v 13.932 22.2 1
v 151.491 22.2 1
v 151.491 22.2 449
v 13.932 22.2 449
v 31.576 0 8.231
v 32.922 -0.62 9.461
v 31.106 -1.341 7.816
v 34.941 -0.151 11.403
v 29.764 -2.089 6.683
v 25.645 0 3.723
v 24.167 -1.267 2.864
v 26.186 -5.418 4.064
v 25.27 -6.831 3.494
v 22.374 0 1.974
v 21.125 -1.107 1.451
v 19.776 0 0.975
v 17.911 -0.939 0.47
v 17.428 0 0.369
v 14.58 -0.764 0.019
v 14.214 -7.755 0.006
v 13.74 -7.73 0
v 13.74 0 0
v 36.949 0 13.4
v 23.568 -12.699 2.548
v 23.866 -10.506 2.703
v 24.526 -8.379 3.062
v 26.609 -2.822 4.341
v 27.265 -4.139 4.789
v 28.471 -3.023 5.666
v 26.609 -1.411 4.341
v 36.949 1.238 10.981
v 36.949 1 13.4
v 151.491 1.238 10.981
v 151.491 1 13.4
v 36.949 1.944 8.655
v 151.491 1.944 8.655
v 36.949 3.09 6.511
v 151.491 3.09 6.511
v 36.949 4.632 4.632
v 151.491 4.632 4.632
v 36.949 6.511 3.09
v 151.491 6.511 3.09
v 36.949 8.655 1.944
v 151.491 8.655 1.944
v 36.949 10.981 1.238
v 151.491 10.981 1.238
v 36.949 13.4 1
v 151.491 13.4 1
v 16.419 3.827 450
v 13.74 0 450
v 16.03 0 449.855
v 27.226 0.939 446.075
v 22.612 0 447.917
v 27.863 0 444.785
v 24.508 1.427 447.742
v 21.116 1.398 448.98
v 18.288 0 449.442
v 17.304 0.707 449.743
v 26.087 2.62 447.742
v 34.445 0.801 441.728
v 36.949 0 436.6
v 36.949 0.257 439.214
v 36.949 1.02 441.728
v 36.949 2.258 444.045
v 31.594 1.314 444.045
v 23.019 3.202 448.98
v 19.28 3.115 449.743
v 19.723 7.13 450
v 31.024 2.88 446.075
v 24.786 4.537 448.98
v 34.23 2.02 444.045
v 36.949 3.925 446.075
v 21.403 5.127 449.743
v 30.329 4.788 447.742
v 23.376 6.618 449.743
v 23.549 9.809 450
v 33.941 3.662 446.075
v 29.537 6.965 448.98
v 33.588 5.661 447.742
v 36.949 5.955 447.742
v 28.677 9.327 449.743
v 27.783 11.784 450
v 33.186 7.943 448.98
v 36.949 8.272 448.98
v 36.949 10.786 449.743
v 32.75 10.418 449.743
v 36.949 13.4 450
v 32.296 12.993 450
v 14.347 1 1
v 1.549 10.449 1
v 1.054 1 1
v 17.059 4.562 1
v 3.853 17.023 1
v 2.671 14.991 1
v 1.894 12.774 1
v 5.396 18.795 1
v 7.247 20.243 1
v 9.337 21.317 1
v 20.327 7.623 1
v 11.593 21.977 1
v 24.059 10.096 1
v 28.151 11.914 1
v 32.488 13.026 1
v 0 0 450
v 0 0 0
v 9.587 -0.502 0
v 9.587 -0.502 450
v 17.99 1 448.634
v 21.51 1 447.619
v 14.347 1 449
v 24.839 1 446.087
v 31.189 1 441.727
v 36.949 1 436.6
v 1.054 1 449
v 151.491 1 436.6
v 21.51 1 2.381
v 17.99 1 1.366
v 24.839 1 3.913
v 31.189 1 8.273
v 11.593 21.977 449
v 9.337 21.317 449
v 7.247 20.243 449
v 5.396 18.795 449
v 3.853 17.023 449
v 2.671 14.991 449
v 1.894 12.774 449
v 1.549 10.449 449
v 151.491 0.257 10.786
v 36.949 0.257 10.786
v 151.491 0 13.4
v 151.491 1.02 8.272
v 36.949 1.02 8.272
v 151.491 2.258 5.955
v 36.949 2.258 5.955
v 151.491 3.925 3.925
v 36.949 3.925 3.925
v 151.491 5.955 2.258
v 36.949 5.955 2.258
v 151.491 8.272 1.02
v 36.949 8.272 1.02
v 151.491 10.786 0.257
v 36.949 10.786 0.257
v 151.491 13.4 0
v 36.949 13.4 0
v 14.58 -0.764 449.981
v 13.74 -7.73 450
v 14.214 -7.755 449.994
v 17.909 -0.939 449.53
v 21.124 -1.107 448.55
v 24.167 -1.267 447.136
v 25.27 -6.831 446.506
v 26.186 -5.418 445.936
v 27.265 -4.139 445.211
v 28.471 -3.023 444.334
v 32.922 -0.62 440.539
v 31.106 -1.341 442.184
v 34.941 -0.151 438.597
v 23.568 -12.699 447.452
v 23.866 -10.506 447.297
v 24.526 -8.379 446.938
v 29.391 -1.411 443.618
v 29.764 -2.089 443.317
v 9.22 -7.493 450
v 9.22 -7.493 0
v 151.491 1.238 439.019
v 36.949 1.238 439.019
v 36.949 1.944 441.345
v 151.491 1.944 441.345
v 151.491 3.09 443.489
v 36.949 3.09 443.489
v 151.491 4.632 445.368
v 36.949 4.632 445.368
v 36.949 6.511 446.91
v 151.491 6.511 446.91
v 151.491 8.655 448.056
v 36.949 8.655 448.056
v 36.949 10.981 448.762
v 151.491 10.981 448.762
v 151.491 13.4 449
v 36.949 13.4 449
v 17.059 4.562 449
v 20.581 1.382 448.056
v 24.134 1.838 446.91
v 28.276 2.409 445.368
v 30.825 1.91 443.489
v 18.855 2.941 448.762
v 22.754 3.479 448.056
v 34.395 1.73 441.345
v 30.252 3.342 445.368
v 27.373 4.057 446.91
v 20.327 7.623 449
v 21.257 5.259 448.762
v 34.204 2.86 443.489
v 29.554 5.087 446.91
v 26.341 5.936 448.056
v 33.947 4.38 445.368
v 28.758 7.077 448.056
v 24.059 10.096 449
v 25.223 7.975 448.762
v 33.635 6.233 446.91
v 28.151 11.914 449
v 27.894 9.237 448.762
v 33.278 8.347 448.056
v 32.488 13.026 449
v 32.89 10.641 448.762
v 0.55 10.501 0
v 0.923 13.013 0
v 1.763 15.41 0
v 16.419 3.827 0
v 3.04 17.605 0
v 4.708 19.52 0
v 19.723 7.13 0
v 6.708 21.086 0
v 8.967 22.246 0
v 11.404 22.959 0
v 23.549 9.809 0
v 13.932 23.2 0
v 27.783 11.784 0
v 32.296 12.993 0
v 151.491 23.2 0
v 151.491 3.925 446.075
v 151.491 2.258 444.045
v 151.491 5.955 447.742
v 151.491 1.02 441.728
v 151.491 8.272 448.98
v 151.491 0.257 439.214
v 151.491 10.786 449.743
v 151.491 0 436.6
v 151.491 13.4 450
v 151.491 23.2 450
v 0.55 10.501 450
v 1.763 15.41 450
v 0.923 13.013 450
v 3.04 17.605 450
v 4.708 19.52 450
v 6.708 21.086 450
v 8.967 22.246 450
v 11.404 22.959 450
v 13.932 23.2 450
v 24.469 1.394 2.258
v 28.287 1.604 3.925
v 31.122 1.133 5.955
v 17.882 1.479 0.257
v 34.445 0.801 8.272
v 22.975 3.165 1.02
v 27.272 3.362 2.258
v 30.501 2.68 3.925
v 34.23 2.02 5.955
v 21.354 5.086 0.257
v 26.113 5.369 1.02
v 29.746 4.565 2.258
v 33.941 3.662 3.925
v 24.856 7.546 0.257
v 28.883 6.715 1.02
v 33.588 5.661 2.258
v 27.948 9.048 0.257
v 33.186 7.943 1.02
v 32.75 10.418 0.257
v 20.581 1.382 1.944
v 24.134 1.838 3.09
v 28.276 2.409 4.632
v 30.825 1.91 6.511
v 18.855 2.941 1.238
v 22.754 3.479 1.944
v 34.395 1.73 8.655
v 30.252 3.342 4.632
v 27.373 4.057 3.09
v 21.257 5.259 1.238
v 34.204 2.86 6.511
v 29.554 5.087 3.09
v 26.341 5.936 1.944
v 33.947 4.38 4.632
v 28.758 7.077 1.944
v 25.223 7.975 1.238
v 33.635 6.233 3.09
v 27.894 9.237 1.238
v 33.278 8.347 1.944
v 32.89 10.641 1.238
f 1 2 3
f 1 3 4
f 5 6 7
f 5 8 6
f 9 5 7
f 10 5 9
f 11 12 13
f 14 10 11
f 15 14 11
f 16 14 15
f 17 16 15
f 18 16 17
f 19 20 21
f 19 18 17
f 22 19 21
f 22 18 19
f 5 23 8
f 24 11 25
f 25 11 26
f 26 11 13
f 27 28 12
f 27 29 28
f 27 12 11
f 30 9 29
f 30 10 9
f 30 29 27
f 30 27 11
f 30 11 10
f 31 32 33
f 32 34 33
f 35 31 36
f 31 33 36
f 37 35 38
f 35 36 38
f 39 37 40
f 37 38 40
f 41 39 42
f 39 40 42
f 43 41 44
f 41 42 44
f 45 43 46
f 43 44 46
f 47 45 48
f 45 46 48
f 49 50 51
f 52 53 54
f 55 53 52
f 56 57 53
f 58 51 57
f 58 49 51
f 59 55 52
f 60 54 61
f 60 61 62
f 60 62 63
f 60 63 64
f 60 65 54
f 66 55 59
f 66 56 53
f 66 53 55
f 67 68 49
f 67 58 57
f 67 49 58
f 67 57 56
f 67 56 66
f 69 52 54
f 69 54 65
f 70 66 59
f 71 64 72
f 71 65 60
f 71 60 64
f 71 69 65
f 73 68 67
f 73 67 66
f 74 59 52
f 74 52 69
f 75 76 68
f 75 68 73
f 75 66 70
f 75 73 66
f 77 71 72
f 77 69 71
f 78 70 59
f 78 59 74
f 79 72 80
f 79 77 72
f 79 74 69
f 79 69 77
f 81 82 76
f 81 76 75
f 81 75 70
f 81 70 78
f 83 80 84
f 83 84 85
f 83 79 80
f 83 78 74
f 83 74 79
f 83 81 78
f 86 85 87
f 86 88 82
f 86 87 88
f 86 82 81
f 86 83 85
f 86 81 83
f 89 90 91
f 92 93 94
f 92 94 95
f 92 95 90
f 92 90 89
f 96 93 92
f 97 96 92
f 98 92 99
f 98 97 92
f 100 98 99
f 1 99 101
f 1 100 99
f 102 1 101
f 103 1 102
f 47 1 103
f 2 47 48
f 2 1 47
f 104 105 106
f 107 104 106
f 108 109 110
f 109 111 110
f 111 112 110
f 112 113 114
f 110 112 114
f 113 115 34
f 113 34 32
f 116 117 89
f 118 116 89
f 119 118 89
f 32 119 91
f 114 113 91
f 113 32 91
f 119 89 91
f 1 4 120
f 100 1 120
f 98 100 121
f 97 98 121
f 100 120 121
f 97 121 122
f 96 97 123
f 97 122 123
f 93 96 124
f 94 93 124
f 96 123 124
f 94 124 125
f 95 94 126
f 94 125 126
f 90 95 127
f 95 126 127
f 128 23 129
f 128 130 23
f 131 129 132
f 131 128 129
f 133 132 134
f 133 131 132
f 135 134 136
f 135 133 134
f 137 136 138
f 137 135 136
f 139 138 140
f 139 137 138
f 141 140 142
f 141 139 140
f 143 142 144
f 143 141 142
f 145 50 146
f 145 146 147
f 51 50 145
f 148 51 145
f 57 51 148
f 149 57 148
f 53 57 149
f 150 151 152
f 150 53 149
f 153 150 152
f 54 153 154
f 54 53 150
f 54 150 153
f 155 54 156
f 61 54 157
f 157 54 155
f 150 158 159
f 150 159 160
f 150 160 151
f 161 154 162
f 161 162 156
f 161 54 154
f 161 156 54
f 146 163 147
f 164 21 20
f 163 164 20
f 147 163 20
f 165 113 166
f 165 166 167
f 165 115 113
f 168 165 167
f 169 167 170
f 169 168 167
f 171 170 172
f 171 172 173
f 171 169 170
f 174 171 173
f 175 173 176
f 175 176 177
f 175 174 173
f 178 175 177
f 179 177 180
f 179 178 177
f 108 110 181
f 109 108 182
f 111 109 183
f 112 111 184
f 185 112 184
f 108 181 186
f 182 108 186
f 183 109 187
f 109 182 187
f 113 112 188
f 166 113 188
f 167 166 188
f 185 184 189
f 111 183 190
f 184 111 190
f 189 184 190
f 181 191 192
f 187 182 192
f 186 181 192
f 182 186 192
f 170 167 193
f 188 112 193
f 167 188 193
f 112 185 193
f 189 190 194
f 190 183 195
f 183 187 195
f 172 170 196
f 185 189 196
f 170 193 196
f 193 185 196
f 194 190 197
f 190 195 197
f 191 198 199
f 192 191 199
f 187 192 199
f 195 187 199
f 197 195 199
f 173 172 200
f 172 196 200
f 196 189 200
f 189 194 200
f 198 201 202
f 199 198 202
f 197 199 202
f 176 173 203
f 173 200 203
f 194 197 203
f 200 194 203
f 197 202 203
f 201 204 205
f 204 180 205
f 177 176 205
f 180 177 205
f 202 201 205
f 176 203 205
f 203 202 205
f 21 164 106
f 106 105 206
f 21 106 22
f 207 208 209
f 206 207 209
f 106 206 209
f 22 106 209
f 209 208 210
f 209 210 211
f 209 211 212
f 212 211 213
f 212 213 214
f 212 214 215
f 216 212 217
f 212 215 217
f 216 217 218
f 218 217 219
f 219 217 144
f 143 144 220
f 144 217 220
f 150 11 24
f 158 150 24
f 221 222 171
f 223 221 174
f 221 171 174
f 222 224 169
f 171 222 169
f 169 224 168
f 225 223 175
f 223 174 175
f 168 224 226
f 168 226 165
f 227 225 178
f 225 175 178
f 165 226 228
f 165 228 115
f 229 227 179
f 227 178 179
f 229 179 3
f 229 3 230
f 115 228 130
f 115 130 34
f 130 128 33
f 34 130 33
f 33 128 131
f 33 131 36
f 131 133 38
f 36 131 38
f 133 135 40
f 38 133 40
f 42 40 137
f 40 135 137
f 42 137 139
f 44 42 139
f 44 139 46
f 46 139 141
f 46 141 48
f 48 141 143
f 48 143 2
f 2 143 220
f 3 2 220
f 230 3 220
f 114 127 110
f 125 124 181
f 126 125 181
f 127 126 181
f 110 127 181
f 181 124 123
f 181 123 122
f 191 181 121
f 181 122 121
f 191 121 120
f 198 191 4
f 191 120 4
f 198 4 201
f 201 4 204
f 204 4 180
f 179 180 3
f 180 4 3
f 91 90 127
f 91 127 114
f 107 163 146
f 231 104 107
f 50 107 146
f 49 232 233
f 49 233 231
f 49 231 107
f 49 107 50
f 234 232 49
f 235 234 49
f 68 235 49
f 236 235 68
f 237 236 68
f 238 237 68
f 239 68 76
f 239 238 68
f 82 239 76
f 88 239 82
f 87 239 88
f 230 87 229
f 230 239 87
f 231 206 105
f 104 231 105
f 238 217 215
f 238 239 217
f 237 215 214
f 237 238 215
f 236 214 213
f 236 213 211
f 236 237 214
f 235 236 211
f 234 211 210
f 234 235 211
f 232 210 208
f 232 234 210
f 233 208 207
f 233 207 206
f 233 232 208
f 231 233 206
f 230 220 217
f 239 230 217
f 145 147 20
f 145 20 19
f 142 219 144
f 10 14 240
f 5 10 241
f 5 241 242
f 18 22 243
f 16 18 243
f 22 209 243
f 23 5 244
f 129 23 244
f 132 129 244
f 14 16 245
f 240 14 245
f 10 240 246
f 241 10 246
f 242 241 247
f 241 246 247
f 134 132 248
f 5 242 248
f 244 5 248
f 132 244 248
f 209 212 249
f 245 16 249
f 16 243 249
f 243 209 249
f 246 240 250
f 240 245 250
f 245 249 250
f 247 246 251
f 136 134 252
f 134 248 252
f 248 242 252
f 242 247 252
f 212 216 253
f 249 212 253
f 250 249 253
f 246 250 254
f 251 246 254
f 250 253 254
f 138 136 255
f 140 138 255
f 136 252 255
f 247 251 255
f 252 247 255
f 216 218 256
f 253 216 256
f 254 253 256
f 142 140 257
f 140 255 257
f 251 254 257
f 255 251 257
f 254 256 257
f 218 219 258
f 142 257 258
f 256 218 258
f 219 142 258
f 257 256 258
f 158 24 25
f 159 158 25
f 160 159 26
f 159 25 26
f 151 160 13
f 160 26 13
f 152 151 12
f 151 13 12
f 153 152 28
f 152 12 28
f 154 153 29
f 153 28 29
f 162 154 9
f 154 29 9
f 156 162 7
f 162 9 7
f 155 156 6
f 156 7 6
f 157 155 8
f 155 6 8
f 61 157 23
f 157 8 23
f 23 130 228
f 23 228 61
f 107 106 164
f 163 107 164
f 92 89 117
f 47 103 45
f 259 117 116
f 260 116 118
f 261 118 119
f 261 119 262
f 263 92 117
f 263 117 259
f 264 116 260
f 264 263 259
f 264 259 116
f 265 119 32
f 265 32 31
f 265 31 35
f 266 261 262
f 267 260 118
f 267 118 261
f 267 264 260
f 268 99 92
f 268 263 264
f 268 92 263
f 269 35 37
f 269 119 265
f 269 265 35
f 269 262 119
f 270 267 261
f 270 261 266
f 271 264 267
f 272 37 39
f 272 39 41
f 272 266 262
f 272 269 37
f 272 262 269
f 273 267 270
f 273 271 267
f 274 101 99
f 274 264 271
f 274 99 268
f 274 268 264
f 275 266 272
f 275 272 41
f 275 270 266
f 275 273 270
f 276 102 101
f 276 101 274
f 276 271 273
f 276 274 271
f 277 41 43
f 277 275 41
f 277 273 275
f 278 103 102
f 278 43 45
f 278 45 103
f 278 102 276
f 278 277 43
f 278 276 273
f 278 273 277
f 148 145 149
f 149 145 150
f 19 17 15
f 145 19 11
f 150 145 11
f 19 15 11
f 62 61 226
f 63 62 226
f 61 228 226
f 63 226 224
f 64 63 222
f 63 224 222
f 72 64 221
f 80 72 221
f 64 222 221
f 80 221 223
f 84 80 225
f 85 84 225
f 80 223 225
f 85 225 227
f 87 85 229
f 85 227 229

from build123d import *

# Parameters (mm, degrees)
BOSS_EXTRUDE1_DEPTH = 450
FILLET1_R           = 13.4
BOSS_EXTRUDE2_DEPTH = 450
FILLET2_R           = 13.4
CUT_EXTRUDE1_DEPTH  = 451.0000001
SHELL1_T            = -1
BOSS_EXTRUDE3_DEPTH = 450
CUT_EXTRUDE2_DEPTH  = 13.698698186


with BuildPart() as part:
    # Sketch2 → Boss-Extrude1 (new body)
    with BuildSketch(Plane.XY):
        Polygon((0, 0), (151.490860479, 0), (151.490860479, 23.2), (1.215860479, 23.2), align=None)
    extrude(amount=BOSS_EXTRUDE1_DEPTH)

    # Fillet1
    fillet1_edges = [part.edges().sort_by_distance(p)[0] for p in [
        (1.215860479, 23.2, 225),
    ]]
    fillet(fillet1_edges, radius=FILLET1_R)

    # Sketch4 → Boss-Extrude2 (add, through all)
    with BuildSketch(Plane.XY.offset(450)):
        with BuildLine():
            Line((24.166834741, -1.266530141), (23.567700201, -12.698698186))
            ThreePointArc((23.567700201, -12.698698186), (27.725384653, -3.679983428), (36.949335967, 0))
            Line((36.949335967, 0), (0, 0))
            Line((0, 0), (9.586843534, -0.50242518))
            Line((9.586843534, -0.50242518), (9.22049184, -7.492831923))
            Line((9.22049184, -7.492831923), (14.213639514, -7.754511704))
            Line((14.213639514, -7.754511704), (14.579991207, -0.764104961))
            Line((14.579991207, -0.764104961), (24.166834741, -1.266530141))
        make_face()
    extrude(amount=-BOSS_EXTRUDE2_DEPTH)

    # Fillet2
    fillet2_edges = [part.edges().sort_by_distance(p)[0] for p in [
        (27.725384653, -3.679983428, 0),
        (27.725384653, -3.679983428, 450),
        (94.220098223, 0, 450),
        (94.220098223, 0, 0),
    ]]
    fillet(fillet2_edges, radius=FILLET2_R)

    # Sketch5 → Cut-Extrude1 (cut, through all)
    with BuildSketch(Plane.XY):
        with BuildLine():
            Line((24.166834741, -1.266530141), (23.567700201, -12.698698186))
            ThreePointArc((23.567700201, -12.698698186), (27.725384653, -3.679983428), (36.949335967, 0))
            Line((36.949335967, 0), (0, 0))
            Line((0, 0), (9.586843534, -0.50242518))
            Line((9.586843534, -0.50242518), (9.22049184, -7.492831923))
            Line((9.22049184, -7.492831923), (14.213639514, -7.754511704))
            Line((14.213639514, -7.754511704), (14.579991207, -0.764104961))
            Line((14.579991207, -0.764104961), (24.166834741, -1.266530141))
        make_face()
    extrude(amount=CUT_EXTRUDE1_DEPTH, mode=Mode.SUBTRACT)

    # Shell1
    shell1_openings = [part.faces().sort_by_distance(p)[0] for p in [
        (151.490860479, 11.274923044, 225),
    ]]
    offset(amount=SHELL1_T, openings=shell1_openings)

    # Sketch6 → Boss-Extrude3 (add)
    with BuildSketch(Plane.XY):
        with BuildLine():
            Line((24.166834741, -1.266530141), (23.567700201, -12.698698186))
            ThreePointArc((23.567700201, -12.698698186), (27.725384653, -3.679983428), (36.949335967, 0))
            Line((36.949335967, 0), (0, 0))
            Line((0, 0), (9.586843534, -0.50242518))
            Line((9.586843534, -0.50242518), (9.22049184, -7.492831923))
            Line((9.22049184, -7.492831923), (14.213639514, -7.754511704))
            Line((14.213639514, -7.754511704), (14.579991207, -0.764104961))
            Line((14.579991207, -0.764104961), (24.166834741, -1.266530141))
        make_face()
    extrude(amount=BOSS_EXTRUDE3_DEPTH)

    # Sketch7 → Cut-Extrude2 (cut, through all)
    with BuildSketch(Plane.XZ):
        with BuildLine():
            Line((13.739855146, 450), (36.949335967, 450))
            Line((36.949335967, 450), (36.949335967, 436.6))
            add(Edge.make_bspline(
                [(13.739855146, 450), (14.897031698, 450), (16.037346218, 449.888583323), (17.726143963, 449.5782461), (18.285436938, 449.450751492), (19.397111441, 449.150094553), (19.951343846, 448.976153087), (22.667401959, 448.011694289), (24.688899416, 446.937288096), (27.088419743, 445.339458648), (27.560915156, 445.007570641), (28.487586558, 444.326213533), (28.942650844, 443.976156414), (30.286745236, 442.902062513), (31.15469064, 442.154118787), (32.853186658, 440.615831161), (33.683710559, 439.825456971), (35.32594722, 438.223379533), (36.139219776, 437.410115889), (36.949335967, 436.6)],
                knots=[0, 0, 0, 0, 0.125, 0.125, 0.1875, 0.1875, 0.25, 0.25, 0.5, 0.5, 0.5625, 0.5625, 0.625, 0.625, 0.75, 0.75, 0.875, 0.875, 1, 1, 1, 1], degree=3))
        make_face()
        with BuildLine():
            Line((36.949335967, 13.4), (36.949335967, 0))
            Line((36.949335967, 0), (13.739855146, 0))
            add(Edge.make_bspline(
                [(36.949335967, 13.4), (36.139219776, 12.589884111), (35.32594722, 11.776620467), (33.683710559, 10.174543029), (32.853186658, 9.384168839), (31.15469064, 7.845881213), (30.286745236, 7.097937487), (28.942650844, 6.023843586), (28.487586558, 5.673786467), (27.560915156, 4.992429359), (27.088419743, 4.660541352), (24.688899416, 3.062711904), (22.667401959, 1.988305711), (19.951343846, 1.023846913), (19.397111441, 0.849905447), (18.285436938, 0.549248508), (17.726143963, 0.4217539), (16.037346218, 0.111416677), (14.897031698, 0), (13.739855146, 0)],
                knots=[0, 0, 0, 0, 0.125, 0.125, 0.25, 0.25, 0.375, 0.375, 0.4375, 0.4375, 0.5, 0.5, 0.75, 0.75, 0.8125, 0.8125, 0.875, 0.875, 1, 1, 1, 1], degree=3))
        make_face()
    extrude(amount=CUT_EXTRUDE2_DEPTH, mode=Mode.SUBTRACT)


solid = part.part
